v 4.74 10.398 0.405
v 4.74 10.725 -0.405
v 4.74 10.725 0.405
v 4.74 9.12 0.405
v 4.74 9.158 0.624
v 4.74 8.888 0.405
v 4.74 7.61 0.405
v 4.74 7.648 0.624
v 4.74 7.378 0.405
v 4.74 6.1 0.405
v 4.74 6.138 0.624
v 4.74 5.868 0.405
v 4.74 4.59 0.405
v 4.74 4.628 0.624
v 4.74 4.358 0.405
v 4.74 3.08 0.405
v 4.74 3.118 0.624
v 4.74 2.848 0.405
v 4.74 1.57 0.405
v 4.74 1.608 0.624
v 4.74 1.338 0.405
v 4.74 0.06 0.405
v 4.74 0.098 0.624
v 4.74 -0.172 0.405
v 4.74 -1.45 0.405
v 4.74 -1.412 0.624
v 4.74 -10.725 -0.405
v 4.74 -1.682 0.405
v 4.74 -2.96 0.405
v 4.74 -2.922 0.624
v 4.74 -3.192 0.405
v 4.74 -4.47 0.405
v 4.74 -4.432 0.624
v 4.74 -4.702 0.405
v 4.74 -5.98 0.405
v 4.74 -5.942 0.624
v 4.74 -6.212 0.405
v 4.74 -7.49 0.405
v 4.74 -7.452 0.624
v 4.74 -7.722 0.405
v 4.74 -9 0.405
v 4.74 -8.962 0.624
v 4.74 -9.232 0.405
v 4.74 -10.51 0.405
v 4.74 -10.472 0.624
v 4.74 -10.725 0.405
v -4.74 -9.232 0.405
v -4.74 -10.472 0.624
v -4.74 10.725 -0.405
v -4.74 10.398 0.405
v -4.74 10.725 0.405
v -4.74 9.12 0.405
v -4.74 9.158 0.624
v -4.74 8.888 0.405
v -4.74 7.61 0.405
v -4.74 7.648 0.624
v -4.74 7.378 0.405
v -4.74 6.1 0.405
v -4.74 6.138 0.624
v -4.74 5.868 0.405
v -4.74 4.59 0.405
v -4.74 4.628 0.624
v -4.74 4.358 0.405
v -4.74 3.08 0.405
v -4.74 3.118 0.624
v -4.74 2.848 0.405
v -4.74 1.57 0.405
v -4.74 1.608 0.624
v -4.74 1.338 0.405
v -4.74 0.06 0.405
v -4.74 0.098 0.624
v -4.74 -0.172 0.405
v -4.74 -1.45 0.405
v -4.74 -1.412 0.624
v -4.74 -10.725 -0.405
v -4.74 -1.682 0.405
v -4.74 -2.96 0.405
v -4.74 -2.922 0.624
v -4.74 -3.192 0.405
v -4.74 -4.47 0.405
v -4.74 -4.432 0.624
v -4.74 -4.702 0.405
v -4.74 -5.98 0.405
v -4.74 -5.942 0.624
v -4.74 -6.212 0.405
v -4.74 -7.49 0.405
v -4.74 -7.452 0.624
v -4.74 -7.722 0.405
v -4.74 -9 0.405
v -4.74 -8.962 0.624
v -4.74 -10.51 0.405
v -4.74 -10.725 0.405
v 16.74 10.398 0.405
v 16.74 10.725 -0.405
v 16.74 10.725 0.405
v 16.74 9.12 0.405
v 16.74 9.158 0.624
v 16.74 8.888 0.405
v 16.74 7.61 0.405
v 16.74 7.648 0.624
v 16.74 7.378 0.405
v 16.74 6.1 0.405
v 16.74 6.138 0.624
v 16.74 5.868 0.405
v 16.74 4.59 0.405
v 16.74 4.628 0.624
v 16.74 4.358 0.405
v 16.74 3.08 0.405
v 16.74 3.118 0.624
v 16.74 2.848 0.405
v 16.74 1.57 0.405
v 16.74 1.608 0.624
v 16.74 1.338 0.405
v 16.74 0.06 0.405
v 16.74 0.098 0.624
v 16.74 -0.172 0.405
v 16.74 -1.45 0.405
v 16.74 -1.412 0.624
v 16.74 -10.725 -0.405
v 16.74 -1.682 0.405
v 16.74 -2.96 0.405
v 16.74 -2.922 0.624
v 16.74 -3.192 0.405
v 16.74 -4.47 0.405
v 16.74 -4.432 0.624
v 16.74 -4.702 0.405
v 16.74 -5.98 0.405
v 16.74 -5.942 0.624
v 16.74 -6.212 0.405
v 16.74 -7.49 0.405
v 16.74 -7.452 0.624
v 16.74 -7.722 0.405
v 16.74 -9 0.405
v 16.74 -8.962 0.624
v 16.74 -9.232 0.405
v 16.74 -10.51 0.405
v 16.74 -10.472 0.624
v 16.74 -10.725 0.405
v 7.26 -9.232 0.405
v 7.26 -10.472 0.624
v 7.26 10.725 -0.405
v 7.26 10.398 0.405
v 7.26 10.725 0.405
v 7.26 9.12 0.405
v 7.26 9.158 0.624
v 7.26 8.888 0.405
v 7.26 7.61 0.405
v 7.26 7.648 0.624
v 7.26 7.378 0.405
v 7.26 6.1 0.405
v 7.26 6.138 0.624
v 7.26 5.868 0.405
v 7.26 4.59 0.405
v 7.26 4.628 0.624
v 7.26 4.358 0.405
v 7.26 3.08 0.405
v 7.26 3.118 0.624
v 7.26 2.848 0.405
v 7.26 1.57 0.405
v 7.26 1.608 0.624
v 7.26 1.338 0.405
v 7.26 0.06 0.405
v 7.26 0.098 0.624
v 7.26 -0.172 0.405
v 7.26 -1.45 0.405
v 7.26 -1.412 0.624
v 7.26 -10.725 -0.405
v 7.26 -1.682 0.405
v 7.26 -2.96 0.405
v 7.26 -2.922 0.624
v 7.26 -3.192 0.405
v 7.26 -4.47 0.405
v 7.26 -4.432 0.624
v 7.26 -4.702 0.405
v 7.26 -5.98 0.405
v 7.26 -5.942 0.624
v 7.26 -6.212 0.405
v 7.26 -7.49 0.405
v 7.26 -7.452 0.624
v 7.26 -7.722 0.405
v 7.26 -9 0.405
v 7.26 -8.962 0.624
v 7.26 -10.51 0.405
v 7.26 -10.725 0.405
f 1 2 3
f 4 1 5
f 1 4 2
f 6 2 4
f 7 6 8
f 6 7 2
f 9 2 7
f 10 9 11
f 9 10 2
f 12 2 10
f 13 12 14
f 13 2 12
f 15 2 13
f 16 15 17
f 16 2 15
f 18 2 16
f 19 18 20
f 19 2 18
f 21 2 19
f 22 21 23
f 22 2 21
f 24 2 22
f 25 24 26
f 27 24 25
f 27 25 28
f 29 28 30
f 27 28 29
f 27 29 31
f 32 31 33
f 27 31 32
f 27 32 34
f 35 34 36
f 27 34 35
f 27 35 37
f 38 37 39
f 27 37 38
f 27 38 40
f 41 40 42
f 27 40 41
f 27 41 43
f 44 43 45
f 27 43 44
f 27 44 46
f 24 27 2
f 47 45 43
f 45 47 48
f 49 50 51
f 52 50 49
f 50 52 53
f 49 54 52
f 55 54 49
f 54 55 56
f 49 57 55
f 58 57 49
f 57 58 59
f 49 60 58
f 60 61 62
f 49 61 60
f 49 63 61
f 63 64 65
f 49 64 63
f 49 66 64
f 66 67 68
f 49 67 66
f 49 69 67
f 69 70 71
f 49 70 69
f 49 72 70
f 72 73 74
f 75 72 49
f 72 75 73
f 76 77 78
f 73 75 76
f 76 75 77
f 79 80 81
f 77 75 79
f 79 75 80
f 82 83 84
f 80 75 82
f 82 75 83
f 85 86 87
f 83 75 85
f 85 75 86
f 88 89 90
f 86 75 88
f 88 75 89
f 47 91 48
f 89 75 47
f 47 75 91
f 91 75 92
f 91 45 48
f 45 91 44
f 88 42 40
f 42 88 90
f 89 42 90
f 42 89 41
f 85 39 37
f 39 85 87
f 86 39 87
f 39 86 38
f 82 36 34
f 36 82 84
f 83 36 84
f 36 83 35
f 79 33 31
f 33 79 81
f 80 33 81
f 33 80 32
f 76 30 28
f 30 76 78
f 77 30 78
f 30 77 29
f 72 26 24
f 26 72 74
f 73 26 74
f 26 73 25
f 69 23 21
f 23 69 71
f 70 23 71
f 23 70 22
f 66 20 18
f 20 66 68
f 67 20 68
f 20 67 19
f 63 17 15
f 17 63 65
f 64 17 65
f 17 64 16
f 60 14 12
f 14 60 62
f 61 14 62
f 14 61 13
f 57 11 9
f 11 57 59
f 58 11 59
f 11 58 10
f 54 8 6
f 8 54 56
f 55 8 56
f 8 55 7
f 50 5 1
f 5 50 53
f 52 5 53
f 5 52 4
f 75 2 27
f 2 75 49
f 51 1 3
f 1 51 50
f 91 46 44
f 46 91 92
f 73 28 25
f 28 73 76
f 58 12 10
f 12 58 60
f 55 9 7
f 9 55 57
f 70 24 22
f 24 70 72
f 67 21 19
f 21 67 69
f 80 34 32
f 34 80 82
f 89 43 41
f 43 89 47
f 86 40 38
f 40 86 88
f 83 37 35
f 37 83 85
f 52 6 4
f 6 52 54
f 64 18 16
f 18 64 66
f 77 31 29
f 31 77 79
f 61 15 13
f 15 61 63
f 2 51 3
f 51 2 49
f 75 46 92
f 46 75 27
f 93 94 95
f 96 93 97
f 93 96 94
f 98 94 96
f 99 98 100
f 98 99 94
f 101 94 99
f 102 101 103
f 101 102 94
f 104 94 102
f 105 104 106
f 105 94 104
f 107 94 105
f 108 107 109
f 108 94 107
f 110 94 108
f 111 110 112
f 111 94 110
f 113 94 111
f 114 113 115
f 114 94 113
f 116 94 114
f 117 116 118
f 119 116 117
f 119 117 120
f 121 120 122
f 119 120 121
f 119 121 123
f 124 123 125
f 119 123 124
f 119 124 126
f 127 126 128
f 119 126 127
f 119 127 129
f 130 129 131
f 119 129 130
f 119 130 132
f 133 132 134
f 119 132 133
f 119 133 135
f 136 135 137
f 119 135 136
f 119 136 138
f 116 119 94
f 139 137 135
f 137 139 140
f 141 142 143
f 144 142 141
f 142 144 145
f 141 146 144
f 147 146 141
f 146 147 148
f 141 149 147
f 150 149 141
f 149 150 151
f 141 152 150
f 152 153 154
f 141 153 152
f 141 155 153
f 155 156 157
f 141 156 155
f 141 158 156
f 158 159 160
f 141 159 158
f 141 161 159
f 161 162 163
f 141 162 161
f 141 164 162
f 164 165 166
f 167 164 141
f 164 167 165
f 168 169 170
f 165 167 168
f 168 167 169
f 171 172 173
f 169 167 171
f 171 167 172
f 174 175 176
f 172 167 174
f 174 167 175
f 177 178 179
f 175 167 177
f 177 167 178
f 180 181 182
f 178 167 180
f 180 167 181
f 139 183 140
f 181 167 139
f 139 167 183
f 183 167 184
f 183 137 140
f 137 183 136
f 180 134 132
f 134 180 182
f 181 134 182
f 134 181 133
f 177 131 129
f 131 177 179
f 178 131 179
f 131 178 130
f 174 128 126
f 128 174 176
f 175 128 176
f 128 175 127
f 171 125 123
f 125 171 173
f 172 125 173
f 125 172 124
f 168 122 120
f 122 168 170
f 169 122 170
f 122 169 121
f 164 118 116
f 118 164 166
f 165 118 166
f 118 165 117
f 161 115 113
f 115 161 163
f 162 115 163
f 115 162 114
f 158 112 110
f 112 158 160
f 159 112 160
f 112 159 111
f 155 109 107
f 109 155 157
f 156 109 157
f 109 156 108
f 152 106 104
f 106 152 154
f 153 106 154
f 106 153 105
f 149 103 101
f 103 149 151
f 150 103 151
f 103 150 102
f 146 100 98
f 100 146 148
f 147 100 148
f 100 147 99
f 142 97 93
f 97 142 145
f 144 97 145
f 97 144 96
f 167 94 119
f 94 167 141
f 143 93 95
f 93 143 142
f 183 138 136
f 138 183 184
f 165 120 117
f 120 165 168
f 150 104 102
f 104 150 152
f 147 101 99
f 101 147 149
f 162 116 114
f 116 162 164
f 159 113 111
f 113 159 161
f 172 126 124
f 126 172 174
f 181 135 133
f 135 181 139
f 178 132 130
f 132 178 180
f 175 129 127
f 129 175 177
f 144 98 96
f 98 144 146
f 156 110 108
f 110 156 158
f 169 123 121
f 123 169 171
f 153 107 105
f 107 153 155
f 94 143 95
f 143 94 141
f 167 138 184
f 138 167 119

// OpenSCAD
// 0.27 layer height
width = 9.48;
height = 21.45;
depth = 0.81;

module slat() {
  cube(size=[width, height, depth], center=true);

  difference() {
    union() {
      for (i = [-6.5 : 6.5]) {
        translate([0,i*1.51,0]) rotate([-10,0,0]) cube(size=[width, 1.51, 1], center=true);
      }
    }
    translate([0,0,-(5 + depth/2)]) cube(size=[10, 25, 10], center=true);
  }
}





slat();
translate([12,0,0]) slat();
